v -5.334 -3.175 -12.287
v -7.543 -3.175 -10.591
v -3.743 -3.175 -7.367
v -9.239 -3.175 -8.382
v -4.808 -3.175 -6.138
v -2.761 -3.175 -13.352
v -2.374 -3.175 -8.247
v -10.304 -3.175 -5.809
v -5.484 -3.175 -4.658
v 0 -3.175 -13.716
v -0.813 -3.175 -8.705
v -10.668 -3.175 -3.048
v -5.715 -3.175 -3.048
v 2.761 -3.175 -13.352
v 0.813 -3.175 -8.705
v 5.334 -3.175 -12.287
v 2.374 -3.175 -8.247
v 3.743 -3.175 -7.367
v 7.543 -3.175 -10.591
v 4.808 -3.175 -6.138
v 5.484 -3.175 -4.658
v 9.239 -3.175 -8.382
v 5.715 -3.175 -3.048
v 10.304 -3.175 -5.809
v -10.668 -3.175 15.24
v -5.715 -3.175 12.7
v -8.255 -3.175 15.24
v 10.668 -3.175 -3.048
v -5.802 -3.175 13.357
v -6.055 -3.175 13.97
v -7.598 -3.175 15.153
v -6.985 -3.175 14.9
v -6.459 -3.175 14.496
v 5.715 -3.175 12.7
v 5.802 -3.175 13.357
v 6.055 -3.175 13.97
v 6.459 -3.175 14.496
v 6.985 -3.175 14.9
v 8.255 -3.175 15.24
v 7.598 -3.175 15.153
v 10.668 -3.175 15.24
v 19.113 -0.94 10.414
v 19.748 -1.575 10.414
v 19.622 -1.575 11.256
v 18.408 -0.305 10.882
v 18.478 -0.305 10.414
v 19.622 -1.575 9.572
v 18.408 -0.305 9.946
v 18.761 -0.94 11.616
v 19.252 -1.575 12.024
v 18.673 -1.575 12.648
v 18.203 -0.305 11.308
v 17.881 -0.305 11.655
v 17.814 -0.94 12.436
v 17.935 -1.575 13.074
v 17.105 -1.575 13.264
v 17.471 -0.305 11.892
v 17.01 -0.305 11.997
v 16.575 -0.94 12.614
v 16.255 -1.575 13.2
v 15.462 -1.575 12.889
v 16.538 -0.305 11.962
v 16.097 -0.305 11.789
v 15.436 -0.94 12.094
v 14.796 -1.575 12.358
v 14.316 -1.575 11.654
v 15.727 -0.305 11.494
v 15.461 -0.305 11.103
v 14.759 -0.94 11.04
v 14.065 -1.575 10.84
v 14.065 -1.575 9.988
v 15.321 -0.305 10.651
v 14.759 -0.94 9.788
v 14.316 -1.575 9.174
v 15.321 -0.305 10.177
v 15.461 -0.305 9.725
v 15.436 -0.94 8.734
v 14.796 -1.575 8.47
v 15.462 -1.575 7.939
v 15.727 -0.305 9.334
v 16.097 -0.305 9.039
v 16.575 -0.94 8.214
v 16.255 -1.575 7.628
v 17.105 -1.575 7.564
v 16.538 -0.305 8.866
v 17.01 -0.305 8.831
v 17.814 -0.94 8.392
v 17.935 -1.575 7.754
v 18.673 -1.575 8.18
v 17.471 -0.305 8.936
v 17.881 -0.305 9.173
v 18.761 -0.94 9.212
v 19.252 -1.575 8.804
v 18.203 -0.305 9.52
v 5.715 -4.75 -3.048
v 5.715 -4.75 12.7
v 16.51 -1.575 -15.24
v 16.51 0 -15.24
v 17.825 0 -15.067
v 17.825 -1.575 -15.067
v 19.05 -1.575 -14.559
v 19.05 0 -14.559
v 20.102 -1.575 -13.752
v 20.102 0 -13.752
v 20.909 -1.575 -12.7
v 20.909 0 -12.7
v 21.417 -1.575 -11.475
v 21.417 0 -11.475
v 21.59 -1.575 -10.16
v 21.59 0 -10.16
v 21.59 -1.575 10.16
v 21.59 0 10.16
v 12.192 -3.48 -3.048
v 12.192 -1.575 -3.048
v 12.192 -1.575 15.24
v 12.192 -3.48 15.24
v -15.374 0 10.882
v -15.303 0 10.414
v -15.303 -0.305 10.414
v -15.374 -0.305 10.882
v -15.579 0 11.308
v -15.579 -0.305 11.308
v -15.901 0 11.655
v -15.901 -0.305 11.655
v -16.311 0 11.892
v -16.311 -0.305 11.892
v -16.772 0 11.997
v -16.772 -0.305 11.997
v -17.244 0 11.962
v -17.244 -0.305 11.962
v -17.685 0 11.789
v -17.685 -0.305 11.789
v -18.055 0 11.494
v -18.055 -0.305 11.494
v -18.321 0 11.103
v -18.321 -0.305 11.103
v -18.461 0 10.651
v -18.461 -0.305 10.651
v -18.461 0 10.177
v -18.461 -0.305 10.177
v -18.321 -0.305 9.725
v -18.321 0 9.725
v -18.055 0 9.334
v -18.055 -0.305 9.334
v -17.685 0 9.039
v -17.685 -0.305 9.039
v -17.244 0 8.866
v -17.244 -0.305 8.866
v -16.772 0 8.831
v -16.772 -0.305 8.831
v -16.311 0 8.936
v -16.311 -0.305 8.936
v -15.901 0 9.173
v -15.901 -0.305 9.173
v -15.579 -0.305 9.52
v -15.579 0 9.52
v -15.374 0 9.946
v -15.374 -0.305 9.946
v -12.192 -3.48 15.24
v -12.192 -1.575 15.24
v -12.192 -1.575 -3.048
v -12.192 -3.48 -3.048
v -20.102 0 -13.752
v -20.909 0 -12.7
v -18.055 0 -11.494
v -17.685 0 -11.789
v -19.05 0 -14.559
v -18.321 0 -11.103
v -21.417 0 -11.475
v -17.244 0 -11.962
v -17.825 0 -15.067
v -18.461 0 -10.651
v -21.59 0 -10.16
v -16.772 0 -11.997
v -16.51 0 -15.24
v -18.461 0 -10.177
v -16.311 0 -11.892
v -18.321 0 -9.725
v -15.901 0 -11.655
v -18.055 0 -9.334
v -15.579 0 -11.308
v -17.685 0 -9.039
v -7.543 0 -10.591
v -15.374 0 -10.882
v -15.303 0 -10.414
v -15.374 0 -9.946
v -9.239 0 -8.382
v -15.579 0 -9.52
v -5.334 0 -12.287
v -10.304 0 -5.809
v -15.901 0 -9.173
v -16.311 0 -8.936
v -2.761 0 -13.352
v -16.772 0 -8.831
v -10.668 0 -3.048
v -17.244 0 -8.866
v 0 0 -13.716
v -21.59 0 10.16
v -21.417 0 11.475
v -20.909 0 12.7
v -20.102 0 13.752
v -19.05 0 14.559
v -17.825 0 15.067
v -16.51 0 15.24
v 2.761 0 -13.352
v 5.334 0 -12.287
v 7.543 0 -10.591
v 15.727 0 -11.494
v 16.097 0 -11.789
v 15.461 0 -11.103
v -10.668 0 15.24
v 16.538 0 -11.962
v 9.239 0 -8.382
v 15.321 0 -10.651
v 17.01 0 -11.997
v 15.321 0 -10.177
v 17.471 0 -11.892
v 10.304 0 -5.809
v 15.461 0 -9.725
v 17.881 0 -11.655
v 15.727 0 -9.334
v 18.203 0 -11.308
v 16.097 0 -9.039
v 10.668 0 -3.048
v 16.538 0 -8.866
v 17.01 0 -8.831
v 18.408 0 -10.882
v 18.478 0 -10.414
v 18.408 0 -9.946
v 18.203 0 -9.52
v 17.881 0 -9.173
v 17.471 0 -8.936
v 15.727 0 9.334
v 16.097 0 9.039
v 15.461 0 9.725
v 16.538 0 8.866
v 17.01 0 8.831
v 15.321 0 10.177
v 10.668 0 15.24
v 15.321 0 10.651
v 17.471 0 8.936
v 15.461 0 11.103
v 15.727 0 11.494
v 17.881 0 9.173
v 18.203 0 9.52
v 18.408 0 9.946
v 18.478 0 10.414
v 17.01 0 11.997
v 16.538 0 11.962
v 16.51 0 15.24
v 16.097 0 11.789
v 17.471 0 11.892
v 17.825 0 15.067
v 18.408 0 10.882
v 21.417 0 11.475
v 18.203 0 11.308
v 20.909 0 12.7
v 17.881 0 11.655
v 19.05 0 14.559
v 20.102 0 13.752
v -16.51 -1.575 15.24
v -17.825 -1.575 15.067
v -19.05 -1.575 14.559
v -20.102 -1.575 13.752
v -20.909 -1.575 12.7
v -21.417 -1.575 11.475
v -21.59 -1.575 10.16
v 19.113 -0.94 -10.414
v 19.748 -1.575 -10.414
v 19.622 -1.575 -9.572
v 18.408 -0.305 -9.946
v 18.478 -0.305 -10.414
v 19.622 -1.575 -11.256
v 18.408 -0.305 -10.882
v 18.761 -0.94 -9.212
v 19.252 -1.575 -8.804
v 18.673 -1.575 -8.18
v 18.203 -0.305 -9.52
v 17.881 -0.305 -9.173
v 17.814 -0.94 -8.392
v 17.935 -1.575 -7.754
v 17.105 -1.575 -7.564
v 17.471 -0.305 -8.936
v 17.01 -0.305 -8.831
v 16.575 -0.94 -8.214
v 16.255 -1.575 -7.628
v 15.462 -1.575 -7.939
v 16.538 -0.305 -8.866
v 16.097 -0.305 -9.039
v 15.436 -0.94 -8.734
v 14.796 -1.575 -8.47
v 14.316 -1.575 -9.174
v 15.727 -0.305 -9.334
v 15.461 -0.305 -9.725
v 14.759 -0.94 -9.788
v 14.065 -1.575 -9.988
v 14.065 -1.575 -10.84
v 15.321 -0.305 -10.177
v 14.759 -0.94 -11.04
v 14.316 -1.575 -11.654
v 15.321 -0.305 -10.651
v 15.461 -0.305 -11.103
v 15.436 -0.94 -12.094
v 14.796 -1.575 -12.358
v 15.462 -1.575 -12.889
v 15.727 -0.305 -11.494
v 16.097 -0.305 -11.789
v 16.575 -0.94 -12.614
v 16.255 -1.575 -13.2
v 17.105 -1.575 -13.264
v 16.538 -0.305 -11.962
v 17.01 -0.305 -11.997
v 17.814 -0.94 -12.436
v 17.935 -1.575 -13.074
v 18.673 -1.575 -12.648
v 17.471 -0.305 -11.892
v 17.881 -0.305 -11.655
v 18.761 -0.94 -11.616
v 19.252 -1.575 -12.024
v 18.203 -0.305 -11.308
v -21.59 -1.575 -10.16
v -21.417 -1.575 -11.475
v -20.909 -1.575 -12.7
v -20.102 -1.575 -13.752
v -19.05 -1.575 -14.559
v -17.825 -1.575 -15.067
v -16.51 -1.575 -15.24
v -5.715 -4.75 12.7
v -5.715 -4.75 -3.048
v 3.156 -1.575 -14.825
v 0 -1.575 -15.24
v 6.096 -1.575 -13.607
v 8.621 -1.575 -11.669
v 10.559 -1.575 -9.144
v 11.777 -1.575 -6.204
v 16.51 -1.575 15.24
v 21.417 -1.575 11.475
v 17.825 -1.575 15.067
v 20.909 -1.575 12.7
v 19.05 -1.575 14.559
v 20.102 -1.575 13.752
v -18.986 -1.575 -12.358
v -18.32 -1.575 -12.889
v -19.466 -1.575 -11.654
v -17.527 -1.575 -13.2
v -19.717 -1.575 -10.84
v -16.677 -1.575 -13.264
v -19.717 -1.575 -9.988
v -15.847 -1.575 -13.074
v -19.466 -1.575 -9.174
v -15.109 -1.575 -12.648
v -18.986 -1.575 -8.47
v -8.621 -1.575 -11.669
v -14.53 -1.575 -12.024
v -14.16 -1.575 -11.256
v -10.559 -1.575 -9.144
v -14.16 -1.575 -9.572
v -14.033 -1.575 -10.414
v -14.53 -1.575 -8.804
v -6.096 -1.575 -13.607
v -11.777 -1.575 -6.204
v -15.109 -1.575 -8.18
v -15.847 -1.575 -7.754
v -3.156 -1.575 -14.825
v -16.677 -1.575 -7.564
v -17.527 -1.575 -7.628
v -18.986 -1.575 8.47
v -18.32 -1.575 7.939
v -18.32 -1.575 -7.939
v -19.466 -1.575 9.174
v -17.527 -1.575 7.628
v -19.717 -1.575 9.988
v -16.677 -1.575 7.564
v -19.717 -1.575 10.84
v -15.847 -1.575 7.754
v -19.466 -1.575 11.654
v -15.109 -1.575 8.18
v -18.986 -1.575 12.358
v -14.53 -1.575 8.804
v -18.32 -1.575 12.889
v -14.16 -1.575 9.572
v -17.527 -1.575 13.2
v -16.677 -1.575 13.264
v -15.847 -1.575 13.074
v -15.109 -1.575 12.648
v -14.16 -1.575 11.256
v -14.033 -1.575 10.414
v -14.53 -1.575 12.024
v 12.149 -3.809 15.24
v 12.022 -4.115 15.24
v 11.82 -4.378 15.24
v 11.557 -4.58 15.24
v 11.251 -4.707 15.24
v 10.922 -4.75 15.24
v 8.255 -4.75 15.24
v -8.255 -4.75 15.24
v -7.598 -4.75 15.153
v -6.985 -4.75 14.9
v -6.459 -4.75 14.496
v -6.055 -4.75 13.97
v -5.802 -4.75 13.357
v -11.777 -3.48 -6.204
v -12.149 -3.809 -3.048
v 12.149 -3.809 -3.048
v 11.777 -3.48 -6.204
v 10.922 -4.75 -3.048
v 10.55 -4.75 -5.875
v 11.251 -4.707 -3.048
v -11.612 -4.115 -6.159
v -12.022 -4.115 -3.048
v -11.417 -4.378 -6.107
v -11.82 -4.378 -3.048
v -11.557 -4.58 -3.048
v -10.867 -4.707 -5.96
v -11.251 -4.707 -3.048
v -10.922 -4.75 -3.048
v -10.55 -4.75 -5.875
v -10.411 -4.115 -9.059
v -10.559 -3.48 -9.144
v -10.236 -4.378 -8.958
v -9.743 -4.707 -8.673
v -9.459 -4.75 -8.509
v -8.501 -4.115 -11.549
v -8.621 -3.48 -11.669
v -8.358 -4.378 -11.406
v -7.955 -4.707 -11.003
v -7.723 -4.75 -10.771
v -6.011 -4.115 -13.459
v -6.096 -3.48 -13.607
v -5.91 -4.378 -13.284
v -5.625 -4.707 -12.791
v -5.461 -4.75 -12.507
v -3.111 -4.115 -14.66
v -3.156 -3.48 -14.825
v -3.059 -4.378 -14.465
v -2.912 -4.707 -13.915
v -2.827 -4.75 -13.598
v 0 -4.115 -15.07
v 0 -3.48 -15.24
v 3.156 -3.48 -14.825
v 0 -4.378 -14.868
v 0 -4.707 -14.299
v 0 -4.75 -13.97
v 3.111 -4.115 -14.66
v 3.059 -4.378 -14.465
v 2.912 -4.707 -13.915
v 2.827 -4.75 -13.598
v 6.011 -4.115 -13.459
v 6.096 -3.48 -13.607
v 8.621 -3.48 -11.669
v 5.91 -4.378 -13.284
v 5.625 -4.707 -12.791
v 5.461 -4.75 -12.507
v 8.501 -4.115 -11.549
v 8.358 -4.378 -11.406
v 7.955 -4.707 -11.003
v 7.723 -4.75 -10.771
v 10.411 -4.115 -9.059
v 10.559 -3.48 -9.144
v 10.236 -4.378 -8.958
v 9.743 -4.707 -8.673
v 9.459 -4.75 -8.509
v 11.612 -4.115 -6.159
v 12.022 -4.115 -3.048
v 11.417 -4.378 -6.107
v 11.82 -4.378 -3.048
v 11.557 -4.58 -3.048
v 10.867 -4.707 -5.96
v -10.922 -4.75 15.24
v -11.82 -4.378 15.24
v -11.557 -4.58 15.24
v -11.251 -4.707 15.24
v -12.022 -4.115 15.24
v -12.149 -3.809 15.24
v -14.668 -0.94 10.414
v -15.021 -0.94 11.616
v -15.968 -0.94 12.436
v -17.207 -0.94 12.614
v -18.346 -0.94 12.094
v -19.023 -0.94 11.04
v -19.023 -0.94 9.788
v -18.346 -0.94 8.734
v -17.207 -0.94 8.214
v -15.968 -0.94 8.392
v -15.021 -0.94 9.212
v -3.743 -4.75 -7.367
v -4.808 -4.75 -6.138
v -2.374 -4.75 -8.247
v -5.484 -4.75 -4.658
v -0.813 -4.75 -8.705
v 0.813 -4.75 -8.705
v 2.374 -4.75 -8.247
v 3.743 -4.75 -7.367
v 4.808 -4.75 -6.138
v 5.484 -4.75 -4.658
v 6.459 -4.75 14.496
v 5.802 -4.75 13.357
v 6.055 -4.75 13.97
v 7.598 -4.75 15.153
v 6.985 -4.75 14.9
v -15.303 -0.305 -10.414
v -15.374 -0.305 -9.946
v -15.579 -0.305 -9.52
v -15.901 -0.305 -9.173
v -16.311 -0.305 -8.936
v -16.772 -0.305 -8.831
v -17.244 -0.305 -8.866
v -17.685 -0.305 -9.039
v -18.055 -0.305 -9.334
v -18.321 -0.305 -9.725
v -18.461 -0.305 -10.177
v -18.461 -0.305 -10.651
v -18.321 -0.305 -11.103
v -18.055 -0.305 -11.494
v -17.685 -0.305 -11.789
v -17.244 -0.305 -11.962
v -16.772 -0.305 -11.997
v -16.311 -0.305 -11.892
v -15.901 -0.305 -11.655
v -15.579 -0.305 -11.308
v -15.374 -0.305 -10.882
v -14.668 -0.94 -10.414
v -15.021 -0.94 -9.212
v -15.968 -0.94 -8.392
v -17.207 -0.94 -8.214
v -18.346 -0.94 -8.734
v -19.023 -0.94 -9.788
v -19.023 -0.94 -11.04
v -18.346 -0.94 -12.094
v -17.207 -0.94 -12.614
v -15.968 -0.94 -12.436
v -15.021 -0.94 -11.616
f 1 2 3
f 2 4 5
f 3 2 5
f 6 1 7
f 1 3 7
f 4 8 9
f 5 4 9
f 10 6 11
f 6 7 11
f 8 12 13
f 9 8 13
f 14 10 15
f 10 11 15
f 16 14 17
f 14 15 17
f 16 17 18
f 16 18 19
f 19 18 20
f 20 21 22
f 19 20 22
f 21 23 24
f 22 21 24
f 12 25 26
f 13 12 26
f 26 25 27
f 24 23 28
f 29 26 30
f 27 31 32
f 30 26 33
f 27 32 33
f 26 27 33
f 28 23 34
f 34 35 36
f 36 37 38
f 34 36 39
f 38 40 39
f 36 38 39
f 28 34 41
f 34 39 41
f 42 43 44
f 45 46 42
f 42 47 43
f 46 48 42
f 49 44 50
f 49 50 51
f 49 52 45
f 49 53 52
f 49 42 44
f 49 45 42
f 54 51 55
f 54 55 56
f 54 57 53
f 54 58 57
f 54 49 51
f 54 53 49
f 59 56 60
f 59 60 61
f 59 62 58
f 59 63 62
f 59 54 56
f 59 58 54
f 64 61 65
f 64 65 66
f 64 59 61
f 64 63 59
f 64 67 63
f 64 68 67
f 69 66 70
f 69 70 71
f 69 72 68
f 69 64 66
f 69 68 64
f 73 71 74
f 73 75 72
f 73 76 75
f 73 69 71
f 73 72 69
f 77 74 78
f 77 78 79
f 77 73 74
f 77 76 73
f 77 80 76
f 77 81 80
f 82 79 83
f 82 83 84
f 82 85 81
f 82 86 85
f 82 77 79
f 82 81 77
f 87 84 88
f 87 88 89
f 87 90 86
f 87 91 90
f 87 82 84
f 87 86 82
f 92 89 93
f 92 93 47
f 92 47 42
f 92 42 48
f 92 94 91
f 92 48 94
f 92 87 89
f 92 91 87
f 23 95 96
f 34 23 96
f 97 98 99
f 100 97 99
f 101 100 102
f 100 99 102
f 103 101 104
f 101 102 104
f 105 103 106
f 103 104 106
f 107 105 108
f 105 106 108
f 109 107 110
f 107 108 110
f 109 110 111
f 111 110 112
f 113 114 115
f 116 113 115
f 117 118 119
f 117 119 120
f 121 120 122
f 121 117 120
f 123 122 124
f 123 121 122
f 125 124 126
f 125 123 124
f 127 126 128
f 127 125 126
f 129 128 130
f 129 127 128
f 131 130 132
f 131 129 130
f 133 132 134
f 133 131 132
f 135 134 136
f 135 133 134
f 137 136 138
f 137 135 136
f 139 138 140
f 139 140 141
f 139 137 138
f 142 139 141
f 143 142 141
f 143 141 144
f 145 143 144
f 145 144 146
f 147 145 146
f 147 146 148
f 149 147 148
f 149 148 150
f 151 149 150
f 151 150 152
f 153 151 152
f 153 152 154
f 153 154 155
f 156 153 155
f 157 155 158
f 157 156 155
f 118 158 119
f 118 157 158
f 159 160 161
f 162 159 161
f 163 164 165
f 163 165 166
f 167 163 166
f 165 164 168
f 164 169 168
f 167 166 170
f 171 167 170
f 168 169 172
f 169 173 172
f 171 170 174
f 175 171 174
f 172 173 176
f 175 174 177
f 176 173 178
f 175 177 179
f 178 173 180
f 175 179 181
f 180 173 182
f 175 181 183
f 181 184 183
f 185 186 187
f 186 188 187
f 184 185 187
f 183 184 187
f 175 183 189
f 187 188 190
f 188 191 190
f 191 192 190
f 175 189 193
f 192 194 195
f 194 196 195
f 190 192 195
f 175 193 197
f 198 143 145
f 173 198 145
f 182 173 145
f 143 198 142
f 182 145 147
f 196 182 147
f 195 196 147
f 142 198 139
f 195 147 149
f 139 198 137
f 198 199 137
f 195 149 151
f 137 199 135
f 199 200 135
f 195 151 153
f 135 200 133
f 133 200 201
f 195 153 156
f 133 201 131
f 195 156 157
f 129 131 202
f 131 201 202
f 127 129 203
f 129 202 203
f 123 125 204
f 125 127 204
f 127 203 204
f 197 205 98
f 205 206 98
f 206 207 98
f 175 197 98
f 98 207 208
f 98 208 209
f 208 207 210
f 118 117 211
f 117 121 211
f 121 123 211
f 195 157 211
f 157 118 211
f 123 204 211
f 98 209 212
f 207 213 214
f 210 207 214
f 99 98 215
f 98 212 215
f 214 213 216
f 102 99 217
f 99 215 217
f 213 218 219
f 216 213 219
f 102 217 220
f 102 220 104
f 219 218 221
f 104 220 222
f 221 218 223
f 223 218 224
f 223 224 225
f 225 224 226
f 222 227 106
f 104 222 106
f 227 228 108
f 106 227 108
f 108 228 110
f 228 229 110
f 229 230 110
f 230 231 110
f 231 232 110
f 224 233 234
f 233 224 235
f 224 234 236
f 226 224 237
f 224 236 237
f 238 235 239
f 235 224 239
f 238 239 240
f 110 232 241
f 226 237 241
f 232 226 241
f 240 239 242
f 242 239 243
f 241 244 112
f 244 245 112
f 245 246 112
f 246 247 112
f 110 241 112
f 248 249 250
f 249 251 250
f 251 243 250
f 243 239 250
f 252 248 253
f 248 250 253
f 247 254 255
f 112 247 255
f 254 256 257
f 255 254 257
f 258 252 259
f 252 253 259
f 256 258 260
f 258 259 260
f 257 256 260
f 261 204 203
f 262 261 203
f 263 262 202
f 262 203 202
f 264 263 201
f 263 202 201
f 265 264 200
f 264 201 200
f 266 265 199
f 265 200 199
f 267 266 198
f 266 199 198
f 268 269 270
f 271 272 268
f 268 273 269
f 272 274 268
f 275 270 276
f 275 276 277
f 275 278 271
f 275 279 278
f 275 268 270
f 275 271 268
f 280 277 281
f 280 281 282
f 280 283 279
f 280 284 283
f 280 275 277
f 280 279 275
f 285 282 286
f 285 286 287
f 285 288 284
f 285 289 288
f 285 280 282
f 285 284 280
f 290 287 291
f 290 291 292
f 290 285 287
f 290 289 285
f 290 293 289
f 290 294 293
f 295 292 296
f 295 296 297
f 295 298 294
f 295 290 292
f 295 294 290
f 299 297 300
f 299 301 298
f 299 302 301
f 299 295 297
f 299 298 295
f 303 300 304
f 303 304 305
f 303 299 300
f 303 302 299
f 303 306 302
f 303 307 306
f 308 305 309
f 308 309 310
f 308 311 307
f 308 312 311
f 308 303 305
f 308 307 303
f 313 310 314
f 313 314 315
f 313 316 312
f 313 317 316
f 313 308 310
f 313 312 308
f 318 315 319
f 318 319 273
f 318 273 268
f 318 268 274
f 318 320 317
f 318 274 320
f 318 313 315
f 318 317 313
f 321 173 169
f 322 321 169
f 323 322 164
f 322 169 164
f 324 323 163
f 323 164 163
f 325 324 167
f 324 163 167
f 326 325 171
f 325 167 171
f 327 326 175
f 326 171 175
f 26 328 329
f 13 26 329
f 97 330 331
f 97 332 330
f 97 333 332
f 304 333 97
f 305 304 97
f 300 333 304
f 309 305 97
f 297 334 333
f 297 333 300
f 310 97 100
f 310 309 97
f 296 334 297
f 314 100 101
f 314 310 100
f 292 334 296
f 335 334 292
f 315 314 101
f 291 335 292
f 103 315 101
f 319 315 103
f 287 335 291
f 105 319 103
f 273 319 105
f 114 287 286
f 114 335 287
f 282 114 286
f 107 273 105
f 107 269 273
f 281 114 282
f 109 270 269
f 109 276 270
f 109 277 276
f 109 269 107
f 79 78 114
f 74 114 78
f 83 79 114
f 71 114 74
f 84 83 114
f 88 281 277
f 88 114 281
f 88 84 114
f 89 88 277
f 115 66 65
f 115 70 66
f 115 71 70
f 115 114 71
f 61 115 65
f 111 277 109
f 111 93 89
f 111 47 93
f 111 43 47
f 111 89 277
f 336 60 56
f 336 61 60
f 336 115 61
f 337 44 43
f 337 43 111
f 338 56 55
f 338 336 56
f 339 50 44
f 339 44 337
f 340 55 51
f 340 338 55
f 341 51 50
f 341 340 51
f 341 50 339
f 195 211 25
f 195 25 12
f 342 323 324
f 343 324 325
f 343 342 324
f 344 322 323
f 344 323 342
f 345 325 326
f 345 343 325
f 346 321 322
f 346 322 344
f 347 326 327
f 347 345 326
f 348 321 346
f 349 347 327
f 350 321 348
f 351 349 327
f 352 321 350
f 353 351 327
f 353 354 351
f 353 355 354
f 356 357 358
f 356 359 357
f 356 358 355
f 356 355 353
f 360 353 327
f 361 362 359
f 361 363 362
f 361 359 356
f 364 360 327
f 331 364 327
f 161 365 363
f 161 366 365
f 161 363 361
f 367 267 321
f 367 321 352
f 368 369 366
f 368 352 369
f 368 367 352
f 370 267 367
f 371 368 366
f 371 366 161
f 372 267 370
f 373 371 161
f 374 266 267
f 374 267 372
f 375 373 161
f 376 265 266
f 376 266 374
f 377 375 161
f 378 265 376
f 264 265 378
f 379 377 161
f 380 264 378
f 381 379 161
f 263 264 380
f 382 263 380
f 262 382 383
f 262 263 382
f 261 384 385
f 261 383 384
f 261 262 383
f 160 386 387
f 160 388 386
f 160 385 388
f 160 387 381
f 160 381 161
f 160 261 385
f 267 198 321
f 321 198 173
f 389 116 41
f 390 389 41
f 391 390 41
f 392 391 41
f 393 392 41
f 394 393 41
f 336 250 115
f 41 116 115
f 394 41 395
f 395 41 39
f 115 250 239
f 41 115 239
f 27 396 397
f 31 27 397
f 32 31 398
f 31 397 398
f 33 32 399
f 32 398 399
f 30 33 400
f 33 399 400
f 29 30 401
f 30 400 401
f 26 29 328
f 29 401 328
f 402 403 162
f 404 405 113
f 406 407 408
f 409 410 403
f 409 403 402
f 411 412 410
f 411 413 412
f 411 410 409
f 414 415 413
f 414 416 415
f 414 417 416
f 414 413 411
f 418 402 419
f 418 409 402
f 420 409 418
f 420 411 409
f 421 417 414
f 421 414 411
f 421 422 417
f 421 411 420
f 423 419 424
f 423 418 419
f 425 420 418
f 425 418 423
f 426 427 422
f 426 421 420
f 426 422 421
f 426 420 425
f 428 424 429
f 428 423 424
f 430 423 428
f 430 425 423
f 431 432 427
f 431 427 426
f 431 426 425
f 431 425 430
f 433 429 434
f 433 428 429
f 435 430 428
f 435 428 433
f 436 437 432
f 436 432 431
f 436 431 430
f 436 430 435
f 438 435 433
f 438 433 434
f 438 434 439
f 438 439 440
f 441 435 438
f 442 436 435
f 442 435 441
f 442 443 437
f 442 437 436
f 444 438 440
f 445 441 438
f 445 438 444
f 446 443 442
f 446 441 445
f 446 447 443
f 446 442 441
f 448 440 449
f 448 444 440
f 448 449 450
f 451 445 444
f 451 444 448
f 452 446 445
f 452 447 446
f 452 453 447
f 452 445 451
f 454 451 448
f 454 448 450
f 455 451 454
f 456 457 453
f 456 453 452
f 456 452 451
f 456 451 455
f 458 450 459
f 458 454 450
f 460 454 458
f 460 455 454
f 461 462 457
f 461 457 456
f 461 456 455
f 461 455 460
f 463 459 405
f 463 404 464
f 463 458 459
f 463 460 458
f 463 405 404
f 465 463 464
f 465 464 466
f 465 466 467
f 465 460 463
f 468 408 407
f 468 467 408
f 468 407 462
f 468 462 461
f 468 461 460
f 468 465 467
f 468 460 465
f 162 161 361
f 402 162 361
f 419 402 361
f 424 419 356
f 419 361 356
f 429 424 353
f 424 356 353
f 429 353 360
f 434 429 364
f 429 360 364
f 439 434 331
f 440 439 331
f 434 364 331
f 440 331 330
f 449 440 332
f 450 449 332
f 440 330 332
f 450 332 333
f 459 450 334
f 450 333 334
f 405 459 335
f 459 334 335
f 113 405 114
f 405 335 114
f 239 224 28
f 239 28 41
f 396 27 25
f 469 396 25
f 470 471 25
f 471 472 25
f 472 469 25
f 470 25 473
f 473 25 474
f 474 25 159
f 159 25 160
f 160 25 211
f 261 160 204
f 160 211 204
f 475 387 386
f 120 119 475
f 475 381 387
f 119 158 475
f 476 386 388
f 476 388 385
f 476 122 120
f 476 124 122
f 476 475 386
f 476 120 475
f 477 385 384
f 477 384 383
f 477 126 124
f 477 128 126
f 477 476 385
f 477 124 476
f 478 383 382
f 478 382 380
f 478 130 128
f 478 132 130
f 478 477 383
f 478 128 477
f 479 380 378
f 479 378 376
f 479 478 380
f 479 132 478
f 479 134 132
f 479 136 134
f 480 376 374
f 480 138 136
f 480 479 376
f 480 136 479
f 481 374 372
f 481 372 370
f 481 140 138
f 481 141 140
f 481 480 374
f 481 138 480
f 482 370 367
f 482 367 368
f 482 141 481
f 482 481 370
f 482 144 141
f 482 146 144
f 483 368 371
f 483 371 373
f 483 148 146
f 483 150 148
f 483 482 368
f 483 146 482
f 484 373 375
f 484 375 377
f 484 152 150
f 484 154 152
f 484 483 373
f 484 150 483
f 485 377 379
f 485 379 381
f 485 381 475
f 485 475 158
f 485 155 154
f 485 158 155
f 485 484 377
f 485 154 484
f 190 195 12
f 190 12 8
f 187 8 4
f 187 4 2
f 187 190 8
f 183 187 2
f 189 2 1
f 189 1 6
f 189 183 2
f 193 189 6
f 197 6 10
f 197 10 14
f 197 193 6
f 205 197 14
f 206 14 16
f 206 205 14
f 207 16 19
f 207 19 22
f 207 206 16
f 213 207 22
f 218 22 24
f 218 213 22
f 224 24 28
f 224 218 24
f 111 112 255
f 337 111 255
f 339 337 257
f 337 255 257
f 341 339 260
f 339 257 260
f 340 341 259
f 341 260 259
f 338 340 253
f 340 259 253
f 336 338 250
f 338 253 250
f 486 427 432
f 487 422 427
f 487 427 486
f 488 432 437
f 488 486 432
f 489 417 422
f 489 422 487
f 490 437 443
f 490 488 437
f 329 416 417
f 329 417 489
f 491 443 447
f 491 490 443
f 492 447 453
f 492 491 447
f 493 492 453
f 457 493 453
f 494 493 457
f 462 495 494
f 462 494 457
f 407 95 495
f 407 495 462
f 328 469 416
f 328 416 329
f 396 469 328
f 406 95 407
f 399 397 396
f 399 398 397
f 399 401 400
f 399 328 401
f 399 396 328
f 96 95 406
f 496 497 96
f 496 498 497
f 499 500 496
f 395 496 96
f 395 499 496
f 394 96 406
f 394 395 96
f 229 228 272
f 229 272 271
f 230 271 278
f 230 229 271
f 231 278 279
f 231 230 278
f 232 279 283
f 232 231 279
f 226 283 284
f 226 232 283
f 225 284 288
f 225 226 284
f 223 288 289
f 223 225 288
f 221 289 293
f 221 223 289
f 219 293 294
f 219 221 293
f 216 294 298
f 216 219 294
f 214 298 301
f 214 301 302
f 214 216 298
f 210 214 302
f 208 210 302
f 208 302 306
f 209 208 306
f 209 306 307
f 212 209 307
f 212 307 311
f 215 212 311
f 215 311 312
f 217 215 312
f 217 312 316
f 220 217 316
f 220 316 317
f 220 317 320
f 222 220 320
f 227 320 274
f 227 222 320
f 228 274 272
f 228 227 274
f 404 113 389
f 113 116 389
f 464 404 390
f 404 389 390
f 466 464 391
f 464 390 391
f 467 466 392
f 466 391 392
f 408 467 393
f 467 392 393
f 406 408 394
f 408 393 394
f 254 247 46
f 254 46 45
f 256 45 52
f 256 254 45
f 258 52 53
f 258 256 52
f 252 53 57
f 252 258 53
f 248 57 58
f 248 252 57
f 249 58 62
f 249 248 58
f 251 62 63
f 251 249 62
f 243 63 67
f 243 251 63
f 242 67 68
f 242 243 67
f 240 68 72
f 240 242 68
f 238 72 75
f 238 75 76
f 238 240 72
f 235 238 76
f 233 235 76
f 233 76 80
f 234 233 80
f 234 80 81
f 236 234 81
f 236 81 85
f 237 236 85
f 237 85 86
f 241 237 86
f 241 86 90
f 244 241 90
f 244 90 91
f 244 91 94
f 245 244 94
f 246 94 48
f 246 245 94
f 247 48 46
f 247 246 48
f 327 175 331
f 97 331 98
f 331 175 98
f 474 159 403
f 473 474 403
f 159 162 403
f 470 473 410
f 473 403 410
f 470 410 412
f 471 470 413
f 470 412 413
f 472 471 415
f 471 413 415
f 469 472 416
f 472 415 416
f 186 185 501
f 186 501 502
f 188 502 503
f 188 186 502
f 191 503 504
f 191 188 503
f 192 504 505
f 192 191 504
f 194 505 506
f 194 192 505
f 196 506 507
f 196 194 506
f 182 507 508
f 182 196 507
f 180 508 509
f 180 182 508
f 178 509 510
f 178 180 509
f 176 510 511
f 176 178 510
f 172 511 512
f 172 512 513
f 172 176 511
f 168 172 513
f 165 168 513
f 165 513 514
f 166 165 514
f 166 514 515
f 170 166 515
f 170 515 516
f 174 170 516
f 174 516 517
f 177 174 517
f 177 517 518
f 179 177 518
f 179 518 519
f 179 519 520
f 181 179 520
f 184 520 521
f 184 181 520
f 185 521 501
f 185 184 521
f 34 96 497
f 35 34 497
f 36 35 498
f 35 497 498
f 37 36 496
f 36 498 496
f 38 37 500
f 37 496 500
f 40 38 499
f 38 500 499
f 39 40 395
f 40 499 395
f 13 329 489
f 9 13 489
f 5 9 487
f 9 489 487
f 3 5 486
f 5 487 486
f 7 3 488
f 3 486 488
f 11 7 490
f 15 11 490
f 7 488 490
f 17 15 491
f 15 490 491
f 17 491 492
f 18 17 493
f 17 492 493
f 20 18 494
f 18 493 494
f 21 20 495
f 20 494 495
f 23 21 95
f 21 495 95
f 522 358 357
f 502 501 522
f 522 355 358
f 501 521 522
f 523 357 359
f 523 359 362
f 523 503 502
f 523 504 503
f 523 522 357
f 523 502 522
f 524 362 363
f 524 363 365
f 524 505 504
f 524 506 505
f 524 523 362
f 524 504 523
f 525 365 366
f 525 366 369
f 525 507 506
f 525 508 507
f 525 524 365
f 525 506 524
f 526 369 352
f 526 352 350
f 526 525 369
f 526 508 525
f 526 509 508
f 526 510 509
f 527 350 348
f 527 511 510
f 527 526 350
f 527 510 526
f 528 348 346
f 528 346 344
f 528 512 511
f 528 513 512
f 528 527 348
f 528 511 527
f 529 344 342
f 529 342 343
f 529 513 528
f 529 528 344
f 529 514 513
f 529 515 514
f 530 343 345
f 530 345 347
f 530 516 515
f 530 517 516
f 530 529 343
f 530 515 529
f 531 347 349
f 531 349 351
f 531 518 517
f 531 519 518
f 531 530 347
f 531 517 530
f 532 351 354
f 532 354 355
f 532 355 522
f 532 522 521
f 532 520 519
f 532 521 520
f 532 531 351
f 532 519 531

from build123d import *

# Parameters (mm, degrees)
F0_R     = 1.5875
F1_DEPTH = 1.5748
F3_DEPTH = 3.175
F5_DEPTH = 3.175
F7_DEPTH = 4.7508
F9_DEPTH = 4.7508
F10_R    = 1.27
F11_SIZE = 1.27


with BuildPart() as f1:
    # F0 (on Front) → F1 (new body)
    with BuildSketch(Plane.XZ):
        with BuildLine():
            ThreePointArc((21.59, 10.16), (20.1021024484, 13.7521024484), (16.51, 15.24))
            Line((16.51, 15.24), (-16.51, 15.24))
            ThreePointArc((-16.51, 15.24), (-20.1021024484, 13.7521024484), (-21.59, 10.16))
            Line((-21.59, 10.16), (-21.59, -10.16))
            ThreePointArc((-21.59, -10.16), (-20.1021024484, -13.7521024484), (-16.51, -15.24))
            Line((-16.51, -15.24), (16.51, -15.24))
            ThreePointArc((16.51, -15.24), (20.1021024484, -13.7521024484), (21.59, -10.16))
            Line((21.59, -10.16), (21.59, 10.16))
        make_face()
        with Locations((-16.891, -10.414)):
            Circle(F0_R, mode=Mode.SUBTRACT)
        with Locations((16.891, -10.414)):
            Circle(F0_R, mode=Mode.SUBTRACT)
        with Locations((-16.891, 10.414)):
            Circle(F0_R, mode=Mode.SUBTRACT)
        with Locations((16.891, 10.414)):
            Circle(F0_R, mode=Mode.SUBTRACT)
    extrude(amount=F1_DEPTH)

    # F2 (on face) → F3 (join)
    with BuildSketch(Plane.XZ.offset(1.5748)):
        with BuildLine():
            ThreePointArc((-12.192, -3.048), (0, -15.24), (12.192, -3.048))
            ThreePointArc((12.192, -3.048), (0, 9.144), (-12.192, -3.048))
        make_face()
        with BuildLine():
            ThreePointArc((-12.192, -3.048), (0, 9.144), (12.192, -3.048))
            Line((12.192, -3.048), (12.192, 15.24))
            Line((12.192, 15.24), (-12.192, 15.24))
            Line((-12.192, 15.24), (-12.192, -3.048))
        make_face()
    extrude(amount=F3_DEPTH)

    # F4 (on Front) → F5 (cut)
    with BuildSketch(Plane.XZ):
        with BuildLine():
            ThreePointArc((-10.668, -3.048), (0, -13.716), (10.668, -3.048))
            ThreePointArc((10.668, -3.048), (0, 7.62), (-10.668, -3.048))
        make_face()
        with BuildLine():
            ThreePointArc((-10.668, -3.048), (0, 7.62), (10.668, -3.048))
            Line((10.668, -3.048), (10.668, 15.24))
            Line((10.668, 15.24), (-10.668, 15.24))
            Line((-10.668, 15.24), (-10.668, -3.048))
        make_face()
    extrude(amount=F5_DEPTH, mode=Mode.SUBTRACT)

    # F6 (on face) → F7 (cut, through all)
    with BuildSketch(Plane.XZ.offset(4.7498)):
        with BuildLine():
            Line((5.715, -3.048), (5.715, 15.24))
            Line((5.715, 15.24), (-5.715, 15.24))
            Line((-5.715, 15.24), (-5.715, -3.048))
            ThreePointArc((-5.715, -3.048), (0, 2.667), (5.715, -3.048))
        make_face()
        with BuildLine():
            ThreePointArc((-5.715, -3.048), (0, -8.763), (5.715, -3.048))
            ThreePointArc((5.715, -3.048), (0, 2.667), (-5.715, -3.048))
        make_face()
    extrude(amount=-F7_DEPTH, mode=Mode.SUBTRACT)

    # F8 (on face) → F9 (cut, through all)
    with BuildSketch(Plane.XZ.offset(4.7498)):
        with BuildLine():
            Line((-5.715, 15.24), (-8.255, 15.24))
            ThreePointArc((-8.255, 15.24), (-6.4589487758, 14.4960512242), (-5.715, 12.7))
            Line((-5.715, 12.7), (-5.715, 15.24))
        make_face()
        with BuildLine():
            Line((5.715, 15.24), (5.715, 12.7))
            ThreePointArc((5.715, 12.7), (6.4589487758, 14.4960512242), (8.255, 15.24))
            Line((8.255, 15.24), (5.715, 15.24))
        make_face()
    extrude(amount=-F9_DEPTH, mode=Mode.SUBTRACT)

    # F10
    f10_edges = [f1.edges().sort_by_distance(p)[0] for p in [
        (0, -4.7498, -15.24),
        (-12.192, -4.7498, 6.096),
        (12.192, -4.7498, 6.096),
    ]]
    fillet(f10_edges, radius=F10_R)

    # F11
    f11_edges = [f1.edges().sort_by_distance(p)[0] for p in [
        (-18.4785, -1.5748, 10.414),
        (-18.4785, -1.5748, -10.414),
        (15.3035, -1.5748, 10.414),
        (15.3035, -1.5748, -10.414),
    ]]
    chamfer(f11_edges, length=F11_SIZE)


solid = f1.part
